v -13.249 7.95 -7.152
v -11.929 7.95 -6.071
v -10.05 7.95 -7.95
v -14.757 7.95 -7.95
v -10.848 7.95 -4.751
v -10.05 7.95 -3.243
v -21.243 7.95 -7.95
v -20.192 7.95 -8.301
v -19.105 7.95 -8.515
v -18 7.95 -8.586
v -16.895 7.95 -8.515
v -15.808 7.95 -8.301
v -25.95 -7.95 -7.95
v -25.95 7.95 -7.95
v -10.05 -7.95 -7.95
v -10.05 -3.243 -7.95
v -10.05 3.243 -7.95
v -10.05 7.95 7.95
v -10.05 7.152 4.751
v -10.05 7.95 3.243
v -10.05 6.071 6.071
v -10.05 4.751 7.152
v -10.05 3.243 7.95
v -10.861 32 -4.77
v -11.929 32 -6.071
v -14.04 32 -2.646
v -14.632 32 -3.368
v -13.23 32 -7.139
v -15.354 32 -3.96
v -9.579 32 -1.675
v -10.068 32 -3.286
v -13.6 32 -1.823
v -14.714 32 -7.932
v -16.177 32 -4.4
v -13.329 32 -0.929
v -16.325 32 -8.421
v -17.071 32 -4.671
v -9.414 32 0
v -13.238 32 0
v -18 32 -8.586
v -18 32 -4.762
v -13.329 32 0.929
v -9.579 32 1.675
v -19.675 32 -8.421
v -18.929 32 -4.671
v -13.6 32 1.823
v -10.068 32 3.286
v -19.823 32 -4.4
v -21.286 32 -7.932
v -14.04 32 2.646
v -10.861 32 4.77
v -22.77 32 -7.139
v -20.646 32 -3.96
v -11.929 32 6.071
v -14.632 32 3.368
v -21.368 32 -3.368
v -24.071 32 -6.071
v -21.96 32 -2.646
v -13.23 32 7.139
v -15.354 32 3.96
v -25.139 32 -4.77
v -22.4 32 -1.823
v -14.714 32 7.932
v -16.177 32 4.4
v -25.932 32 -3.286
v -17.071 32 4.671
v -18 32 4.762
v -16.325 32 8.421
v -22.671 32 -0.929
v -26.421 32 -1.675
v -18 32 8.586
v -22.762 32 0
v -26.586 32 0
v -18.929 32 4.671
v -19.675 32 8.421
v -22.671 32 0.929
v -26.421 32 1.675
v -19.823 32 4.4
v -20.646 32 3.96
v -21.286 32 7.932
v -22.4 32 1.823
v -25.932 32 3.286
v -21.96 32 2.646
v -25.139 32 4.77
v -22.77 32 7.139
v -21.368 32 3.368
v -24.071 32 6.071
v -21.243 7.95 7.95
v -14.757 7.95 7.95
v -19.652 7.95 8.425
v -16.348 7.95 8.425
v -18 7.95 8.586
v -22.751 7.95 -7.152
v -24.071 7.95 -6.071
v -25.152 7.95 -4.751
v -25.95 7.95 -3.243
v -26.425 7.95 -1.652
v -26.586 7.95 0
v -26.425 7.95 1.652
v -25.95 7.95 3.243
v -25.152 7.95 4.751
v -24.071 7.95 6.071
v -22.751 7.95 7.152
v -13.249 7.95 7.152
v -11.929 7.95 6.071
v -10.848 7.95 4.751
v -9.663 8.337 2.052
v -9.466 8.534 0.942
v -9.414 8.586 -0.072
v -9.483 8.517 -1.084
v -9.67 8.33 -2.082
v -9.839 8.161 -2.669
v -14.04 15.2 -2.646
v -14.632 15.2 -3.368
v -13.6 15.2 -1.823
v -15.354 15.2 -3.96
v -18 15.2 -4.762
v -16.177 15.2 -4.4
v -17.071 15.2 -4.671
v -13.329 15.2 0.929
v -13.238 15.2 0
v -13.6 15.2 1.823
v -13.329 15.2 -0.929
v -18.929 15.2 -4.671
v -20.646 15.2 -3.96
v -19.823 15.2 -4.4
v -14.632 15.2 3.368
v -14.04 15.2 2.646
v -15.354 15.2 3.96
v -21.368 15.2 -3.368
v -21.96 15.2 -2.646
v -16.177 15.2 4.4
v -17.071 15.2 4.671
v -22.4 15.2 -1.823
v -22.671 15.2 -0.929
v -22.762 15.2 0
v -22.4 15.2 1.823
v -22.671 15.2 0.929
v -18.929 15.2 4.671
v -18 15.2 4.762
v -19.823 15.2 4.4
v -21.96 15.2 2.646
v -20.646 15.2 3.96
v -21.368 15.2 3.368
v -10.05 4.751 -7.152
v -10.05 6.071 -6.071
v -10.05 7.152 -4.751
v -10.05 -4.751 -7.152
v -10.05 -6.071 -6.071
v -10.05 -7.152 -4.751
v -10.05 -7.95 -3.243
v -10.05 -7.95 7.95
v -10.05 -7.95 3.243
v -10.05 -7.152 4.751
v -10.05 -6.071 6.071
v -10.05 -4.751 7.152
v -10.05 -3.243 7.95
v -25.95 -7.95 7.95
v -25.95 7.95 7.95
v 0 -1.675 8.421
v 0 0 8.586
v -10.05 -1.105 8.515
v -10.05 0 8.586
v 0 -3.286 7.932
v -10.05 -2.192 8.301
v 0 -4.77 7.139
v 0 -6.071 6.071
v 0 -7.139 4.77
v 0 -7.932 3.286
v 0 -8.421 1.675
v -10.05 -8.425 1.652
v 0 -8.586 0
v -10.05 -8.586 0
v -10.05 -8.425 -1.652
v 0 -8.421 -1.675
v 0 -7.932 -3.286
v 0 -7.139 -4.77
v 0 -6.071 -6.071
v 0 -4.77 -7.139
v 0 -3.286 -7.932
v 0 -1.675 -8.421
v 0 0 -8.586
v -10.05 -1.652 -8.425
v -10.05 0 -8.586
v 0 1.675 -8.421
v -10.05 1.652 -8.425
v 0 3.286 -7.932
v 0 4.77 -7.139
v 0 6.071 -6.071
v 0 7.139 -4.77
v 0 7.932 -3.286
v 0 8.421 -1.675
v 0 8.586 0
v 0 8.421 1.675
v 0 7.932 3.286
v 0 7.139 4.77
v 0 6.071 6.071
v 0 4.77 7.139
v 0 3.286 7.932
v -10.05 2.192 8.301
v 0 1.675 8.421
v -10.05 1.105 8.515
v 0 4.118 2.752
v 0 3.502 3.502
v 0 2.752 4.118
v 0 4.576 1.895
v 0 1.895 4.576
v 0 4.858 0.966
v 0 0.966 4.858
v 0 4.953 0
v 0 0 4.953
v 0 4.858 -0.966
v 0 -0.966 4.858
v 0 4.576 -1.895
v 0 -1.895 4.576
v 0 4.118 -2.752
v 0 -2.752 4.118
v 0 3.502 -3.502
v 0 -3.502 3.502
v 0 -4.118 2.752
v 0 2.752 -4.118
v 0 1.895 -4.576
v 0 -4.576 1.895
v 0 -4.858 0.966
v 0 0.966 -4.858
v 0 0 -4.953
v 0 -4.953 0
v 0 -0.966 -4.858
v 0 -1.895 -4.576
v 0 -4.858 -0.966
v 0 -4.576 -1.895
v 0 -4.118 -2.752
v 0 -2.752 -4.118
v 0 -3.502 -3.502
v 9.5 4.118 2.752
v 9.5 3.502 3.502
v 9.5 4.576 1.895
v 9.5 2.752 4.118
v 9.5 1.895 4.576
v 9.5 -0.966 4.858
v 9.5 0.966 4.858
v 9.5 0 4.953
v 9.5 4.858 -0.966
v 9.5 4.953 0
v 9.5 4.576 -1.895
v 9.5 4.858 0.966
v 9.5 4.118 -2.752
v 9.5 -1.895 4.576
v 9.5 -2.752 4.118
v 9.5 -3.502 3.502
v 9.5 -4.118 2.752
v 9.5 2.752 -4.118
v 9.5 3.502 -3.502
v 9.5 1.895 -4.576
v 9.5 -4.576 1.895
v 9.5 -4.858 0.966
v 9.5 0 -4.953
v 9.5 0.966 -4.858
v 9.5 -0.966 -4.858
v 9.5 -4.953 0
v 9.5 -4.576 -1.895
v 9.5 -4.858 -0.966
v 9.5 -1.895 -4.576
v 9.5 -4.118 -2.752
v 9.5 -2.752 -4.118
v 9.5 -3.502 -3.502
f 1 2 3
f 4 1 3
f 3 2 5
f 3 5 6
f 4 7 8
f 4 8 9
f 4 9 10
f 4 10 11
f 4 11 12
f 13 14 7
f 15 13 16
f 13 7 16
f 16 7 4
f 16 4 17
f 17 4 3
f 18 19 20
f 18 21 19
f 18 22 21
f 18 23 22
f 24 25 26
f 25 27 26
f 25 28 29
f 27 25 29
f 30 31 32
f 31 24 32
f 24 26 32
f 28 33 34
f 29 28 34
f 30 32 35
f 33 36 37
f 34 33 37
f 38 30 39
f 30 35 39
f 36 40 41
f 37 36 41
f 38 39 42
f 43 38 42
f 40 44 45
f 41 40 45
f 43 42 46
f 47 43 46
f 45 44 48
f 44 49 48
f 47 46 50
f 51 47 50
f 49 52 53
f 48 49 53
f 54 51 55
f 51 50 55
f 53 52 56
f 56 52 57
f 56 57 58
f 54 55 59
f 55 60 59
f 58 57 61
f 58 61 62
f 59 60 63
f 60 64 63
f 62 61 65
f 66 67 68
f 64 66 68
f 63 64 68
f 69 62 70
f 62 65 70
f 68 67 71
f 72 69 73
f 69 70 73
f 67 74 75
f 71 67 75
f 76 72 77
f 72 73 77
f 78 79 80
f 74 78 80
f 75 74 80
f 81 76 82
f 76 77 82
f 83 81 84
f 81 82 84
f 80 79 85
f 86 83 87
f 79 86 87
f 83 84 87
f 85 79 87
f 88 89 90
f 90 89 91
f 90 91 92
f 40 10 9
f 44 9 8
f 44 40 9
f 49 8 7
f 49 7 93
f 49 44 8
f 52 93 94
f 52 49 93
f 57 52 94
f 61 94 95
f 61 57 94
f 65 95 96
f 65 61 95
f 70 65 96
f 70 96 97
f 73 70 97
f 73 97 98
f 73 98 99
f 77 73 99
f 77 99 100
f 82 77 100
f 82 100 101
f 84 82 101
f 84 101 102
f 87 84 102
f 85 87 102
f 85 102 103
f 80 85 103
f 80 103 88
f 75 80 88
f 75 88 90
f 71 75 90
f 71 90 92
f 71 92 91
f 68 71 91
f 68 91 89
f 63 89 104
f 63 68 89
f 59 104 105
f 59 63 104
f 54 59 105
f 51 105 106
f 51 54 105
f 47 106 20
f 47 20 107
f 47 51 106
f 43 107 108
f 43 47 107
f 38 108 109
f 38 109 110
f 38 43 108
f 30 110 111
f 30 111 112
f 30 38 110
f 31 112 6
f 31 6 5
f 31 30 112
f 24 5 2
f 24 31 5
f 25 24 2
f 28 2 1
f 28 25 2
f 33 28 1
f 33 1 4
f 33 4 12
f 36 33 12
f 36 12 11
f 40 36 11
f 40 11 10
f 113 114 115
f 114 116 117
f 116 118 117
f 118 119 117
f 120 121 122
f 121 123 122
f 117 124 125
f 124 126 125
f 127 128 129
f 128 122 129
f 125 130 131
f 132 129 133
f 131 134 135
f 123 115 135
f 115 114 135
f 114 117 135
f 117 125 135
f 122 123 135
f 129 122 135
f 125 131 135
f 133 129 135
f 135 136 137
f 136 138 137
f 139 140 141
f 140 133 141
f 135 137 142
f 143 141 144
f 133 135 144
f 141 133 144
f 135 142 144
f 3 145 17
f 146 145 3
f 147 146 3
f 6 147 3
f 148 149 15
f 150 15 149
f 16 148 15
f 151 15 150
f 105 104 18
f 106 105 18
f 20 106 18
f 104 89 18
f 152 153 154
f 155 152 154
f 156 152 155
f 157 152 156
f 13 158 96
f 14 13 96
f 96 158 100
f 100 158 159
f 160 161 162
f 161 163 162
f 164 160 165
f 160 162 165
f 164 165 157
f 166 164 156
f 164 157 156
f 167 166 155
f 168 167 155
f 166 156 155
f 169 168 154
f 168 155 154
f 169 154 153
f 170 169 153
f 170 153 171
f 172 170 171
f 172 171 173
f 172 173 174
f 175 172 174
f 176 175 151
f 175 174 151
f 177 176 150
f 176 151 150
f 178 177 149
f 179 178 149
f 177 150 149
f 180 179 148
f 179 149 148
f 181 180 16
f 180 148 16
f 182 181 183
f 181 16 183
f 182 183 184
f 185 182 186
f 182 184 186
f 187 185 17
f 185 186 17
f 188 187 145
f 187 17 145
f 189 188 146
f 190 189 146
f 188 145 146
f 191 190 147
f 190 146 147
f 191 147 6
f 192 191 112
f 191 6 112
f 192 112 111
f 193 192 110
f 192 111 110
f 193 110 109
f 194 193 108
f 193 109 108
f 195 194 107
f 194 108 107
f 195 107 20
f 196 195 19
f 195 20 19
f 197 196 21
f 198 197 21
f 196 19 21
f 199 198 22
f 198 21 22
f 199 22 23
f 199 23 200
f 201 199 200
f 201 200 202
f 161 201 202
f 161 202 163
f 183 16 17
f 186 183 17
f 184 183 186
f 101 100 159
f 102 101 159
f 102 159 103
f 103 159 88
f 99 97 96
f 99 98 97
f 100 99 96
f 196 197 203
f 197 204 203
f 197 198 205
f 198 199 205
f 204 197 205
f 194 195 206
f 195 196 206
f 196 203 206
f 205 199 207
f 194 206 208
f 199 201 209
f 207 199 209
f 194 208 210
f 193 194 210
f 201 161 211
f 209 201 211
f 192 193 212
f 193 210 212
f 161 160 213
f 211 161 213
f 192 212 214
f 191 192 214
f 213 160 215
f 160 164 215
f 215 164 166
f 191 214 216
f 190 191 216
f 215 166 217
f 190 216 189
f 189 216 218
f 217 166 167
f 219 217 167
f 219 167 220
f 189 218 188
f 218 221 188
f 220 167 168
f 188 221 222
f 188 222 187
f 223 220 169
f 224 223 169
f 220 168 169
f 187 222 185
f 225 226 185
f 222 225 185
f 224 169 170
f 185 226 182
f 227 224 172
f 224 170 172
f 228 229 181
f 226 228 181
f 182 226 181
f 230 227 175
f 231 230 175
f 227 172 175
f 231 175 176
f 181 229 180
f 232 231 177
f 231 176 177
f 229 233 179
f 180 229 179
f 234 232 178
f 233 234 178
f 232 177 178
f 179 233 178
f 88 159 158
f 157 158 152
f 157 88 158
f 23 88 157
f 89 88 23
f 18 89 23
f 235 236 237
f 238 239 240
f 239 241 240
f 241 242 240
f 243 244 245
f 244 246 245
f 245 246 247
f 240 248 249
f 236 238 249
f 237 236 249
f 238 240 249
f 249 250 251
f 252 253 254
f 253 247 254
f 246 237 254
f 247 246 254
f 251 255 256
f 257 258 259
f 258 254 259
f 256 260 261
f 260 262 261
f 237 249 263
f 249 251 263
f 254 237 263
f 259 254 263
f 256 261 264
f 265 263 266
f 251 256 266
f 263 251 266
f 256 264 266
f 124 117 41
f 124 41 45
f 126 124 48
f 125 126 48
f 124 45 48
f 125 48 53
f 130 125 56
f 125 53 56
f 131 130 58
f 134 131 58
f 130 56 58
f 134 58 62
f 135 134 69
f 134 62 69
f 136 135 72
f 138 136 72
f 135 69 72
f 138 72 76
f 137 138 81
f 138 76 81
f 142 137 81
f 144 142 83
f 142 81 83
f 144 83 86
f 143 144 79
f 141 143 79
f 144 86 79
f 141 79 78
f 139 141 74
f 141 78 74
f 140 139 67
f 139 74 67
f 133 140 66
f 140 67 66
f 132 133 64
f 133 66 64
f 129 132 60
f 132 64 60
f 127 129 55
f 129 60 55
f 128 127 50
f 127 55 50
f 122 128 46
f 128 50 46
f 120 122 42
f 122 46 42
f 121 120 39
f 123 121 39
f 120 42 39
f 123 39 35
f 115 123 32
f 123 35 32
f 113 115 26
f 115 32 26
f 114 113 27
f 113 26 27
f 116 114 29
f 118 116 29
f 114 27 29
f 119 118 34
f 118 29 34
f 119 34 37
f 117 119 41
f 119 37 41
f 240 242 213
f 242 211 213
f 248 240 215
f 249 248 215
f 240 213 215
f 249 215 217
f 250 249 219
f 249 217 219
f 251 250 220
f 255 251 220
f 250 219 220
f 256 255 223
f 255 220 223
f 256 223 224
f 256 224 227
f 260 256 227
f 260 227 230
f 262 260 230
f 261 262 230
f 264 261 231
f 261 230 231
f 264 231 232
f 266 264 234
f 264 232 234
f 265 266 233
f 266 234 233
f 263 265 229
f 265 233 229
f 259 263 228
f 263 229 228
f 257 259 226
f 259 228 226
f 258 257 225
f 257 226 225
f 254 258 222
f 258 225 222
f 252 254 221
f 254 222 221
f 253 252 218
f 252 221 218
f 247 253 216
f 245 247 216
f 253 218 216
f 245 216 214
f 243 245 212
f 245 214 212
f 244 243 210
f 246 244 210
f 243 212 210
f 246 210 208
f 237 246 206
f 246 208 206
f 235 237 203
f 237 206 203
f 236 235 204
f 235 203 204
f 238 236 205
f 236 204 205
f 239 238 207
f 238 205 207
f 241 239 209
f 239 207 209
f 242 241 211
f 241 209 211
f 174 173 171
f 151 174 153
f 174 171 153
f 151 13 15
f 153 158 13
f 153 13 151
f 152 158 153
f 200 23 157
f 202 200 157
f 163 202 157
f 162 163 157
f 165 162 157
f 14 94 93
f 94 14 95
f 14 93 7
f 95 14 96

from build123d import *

# Parameters (mm, degrees)
BLOCK_SKETCH_W  = 15.9
BLOCK_SKETCH_H  = 15.9
BLOCK_DEPTH     = 7.95
ARM_SKETCH_W    = 8.586
ARM_SKETCH_H    = 24.05
SOCKET_SKETCH_W = 4.7625
SOCKET_SKETCH_H = 17.8


with BuildPart() as part:
    # Block Sketch → Block (new, symmetric)
    with BuildSketch(Plane.XY):
        with Locations((-18, 0)):
            Rectangle(BLOCK_SKETCH_W, BLOCK_SKETCH_H)
    extrude(amount=BLOCK_DEPTH, both=True)

    # Neck and Stud Sketch → Neck and Stud (revolve)
    with BuildSketch(Plane.XY):
        Polygon((9.5, 0), (9.5, 4.953), (0, 4.953), (0, 8.586), (-10.05, 8.586), (-10.05, 0), align=None)
    revolve(axis=Axis((-1000, 0, 0), (1, 0, 0)))

    # Arm Sketch → Arm (revolve)
    with BuildSketch(Plane.XY):
        with Locations((-13.707, 19.975)):
            Rectangle(ARM_SKETCH_W, ARM_SKETCH_H)
    revolve(axis=Axis((-18, 0, 0), (0, 1, 0)))

    # Socket Sketch → Socket (revolve, cut)
    with BuildSketch(Plane.XY):
        with Locations((-15.61875, 24.1)):
            Rectangle(SOCKET_SKETCH_W, SOCKET_SKETCH_H)
    revolve(axis=Axis((-18, 0, 0), (0, 1, 0)), mode=Mode.SUBTRACT)


solid = part.part
